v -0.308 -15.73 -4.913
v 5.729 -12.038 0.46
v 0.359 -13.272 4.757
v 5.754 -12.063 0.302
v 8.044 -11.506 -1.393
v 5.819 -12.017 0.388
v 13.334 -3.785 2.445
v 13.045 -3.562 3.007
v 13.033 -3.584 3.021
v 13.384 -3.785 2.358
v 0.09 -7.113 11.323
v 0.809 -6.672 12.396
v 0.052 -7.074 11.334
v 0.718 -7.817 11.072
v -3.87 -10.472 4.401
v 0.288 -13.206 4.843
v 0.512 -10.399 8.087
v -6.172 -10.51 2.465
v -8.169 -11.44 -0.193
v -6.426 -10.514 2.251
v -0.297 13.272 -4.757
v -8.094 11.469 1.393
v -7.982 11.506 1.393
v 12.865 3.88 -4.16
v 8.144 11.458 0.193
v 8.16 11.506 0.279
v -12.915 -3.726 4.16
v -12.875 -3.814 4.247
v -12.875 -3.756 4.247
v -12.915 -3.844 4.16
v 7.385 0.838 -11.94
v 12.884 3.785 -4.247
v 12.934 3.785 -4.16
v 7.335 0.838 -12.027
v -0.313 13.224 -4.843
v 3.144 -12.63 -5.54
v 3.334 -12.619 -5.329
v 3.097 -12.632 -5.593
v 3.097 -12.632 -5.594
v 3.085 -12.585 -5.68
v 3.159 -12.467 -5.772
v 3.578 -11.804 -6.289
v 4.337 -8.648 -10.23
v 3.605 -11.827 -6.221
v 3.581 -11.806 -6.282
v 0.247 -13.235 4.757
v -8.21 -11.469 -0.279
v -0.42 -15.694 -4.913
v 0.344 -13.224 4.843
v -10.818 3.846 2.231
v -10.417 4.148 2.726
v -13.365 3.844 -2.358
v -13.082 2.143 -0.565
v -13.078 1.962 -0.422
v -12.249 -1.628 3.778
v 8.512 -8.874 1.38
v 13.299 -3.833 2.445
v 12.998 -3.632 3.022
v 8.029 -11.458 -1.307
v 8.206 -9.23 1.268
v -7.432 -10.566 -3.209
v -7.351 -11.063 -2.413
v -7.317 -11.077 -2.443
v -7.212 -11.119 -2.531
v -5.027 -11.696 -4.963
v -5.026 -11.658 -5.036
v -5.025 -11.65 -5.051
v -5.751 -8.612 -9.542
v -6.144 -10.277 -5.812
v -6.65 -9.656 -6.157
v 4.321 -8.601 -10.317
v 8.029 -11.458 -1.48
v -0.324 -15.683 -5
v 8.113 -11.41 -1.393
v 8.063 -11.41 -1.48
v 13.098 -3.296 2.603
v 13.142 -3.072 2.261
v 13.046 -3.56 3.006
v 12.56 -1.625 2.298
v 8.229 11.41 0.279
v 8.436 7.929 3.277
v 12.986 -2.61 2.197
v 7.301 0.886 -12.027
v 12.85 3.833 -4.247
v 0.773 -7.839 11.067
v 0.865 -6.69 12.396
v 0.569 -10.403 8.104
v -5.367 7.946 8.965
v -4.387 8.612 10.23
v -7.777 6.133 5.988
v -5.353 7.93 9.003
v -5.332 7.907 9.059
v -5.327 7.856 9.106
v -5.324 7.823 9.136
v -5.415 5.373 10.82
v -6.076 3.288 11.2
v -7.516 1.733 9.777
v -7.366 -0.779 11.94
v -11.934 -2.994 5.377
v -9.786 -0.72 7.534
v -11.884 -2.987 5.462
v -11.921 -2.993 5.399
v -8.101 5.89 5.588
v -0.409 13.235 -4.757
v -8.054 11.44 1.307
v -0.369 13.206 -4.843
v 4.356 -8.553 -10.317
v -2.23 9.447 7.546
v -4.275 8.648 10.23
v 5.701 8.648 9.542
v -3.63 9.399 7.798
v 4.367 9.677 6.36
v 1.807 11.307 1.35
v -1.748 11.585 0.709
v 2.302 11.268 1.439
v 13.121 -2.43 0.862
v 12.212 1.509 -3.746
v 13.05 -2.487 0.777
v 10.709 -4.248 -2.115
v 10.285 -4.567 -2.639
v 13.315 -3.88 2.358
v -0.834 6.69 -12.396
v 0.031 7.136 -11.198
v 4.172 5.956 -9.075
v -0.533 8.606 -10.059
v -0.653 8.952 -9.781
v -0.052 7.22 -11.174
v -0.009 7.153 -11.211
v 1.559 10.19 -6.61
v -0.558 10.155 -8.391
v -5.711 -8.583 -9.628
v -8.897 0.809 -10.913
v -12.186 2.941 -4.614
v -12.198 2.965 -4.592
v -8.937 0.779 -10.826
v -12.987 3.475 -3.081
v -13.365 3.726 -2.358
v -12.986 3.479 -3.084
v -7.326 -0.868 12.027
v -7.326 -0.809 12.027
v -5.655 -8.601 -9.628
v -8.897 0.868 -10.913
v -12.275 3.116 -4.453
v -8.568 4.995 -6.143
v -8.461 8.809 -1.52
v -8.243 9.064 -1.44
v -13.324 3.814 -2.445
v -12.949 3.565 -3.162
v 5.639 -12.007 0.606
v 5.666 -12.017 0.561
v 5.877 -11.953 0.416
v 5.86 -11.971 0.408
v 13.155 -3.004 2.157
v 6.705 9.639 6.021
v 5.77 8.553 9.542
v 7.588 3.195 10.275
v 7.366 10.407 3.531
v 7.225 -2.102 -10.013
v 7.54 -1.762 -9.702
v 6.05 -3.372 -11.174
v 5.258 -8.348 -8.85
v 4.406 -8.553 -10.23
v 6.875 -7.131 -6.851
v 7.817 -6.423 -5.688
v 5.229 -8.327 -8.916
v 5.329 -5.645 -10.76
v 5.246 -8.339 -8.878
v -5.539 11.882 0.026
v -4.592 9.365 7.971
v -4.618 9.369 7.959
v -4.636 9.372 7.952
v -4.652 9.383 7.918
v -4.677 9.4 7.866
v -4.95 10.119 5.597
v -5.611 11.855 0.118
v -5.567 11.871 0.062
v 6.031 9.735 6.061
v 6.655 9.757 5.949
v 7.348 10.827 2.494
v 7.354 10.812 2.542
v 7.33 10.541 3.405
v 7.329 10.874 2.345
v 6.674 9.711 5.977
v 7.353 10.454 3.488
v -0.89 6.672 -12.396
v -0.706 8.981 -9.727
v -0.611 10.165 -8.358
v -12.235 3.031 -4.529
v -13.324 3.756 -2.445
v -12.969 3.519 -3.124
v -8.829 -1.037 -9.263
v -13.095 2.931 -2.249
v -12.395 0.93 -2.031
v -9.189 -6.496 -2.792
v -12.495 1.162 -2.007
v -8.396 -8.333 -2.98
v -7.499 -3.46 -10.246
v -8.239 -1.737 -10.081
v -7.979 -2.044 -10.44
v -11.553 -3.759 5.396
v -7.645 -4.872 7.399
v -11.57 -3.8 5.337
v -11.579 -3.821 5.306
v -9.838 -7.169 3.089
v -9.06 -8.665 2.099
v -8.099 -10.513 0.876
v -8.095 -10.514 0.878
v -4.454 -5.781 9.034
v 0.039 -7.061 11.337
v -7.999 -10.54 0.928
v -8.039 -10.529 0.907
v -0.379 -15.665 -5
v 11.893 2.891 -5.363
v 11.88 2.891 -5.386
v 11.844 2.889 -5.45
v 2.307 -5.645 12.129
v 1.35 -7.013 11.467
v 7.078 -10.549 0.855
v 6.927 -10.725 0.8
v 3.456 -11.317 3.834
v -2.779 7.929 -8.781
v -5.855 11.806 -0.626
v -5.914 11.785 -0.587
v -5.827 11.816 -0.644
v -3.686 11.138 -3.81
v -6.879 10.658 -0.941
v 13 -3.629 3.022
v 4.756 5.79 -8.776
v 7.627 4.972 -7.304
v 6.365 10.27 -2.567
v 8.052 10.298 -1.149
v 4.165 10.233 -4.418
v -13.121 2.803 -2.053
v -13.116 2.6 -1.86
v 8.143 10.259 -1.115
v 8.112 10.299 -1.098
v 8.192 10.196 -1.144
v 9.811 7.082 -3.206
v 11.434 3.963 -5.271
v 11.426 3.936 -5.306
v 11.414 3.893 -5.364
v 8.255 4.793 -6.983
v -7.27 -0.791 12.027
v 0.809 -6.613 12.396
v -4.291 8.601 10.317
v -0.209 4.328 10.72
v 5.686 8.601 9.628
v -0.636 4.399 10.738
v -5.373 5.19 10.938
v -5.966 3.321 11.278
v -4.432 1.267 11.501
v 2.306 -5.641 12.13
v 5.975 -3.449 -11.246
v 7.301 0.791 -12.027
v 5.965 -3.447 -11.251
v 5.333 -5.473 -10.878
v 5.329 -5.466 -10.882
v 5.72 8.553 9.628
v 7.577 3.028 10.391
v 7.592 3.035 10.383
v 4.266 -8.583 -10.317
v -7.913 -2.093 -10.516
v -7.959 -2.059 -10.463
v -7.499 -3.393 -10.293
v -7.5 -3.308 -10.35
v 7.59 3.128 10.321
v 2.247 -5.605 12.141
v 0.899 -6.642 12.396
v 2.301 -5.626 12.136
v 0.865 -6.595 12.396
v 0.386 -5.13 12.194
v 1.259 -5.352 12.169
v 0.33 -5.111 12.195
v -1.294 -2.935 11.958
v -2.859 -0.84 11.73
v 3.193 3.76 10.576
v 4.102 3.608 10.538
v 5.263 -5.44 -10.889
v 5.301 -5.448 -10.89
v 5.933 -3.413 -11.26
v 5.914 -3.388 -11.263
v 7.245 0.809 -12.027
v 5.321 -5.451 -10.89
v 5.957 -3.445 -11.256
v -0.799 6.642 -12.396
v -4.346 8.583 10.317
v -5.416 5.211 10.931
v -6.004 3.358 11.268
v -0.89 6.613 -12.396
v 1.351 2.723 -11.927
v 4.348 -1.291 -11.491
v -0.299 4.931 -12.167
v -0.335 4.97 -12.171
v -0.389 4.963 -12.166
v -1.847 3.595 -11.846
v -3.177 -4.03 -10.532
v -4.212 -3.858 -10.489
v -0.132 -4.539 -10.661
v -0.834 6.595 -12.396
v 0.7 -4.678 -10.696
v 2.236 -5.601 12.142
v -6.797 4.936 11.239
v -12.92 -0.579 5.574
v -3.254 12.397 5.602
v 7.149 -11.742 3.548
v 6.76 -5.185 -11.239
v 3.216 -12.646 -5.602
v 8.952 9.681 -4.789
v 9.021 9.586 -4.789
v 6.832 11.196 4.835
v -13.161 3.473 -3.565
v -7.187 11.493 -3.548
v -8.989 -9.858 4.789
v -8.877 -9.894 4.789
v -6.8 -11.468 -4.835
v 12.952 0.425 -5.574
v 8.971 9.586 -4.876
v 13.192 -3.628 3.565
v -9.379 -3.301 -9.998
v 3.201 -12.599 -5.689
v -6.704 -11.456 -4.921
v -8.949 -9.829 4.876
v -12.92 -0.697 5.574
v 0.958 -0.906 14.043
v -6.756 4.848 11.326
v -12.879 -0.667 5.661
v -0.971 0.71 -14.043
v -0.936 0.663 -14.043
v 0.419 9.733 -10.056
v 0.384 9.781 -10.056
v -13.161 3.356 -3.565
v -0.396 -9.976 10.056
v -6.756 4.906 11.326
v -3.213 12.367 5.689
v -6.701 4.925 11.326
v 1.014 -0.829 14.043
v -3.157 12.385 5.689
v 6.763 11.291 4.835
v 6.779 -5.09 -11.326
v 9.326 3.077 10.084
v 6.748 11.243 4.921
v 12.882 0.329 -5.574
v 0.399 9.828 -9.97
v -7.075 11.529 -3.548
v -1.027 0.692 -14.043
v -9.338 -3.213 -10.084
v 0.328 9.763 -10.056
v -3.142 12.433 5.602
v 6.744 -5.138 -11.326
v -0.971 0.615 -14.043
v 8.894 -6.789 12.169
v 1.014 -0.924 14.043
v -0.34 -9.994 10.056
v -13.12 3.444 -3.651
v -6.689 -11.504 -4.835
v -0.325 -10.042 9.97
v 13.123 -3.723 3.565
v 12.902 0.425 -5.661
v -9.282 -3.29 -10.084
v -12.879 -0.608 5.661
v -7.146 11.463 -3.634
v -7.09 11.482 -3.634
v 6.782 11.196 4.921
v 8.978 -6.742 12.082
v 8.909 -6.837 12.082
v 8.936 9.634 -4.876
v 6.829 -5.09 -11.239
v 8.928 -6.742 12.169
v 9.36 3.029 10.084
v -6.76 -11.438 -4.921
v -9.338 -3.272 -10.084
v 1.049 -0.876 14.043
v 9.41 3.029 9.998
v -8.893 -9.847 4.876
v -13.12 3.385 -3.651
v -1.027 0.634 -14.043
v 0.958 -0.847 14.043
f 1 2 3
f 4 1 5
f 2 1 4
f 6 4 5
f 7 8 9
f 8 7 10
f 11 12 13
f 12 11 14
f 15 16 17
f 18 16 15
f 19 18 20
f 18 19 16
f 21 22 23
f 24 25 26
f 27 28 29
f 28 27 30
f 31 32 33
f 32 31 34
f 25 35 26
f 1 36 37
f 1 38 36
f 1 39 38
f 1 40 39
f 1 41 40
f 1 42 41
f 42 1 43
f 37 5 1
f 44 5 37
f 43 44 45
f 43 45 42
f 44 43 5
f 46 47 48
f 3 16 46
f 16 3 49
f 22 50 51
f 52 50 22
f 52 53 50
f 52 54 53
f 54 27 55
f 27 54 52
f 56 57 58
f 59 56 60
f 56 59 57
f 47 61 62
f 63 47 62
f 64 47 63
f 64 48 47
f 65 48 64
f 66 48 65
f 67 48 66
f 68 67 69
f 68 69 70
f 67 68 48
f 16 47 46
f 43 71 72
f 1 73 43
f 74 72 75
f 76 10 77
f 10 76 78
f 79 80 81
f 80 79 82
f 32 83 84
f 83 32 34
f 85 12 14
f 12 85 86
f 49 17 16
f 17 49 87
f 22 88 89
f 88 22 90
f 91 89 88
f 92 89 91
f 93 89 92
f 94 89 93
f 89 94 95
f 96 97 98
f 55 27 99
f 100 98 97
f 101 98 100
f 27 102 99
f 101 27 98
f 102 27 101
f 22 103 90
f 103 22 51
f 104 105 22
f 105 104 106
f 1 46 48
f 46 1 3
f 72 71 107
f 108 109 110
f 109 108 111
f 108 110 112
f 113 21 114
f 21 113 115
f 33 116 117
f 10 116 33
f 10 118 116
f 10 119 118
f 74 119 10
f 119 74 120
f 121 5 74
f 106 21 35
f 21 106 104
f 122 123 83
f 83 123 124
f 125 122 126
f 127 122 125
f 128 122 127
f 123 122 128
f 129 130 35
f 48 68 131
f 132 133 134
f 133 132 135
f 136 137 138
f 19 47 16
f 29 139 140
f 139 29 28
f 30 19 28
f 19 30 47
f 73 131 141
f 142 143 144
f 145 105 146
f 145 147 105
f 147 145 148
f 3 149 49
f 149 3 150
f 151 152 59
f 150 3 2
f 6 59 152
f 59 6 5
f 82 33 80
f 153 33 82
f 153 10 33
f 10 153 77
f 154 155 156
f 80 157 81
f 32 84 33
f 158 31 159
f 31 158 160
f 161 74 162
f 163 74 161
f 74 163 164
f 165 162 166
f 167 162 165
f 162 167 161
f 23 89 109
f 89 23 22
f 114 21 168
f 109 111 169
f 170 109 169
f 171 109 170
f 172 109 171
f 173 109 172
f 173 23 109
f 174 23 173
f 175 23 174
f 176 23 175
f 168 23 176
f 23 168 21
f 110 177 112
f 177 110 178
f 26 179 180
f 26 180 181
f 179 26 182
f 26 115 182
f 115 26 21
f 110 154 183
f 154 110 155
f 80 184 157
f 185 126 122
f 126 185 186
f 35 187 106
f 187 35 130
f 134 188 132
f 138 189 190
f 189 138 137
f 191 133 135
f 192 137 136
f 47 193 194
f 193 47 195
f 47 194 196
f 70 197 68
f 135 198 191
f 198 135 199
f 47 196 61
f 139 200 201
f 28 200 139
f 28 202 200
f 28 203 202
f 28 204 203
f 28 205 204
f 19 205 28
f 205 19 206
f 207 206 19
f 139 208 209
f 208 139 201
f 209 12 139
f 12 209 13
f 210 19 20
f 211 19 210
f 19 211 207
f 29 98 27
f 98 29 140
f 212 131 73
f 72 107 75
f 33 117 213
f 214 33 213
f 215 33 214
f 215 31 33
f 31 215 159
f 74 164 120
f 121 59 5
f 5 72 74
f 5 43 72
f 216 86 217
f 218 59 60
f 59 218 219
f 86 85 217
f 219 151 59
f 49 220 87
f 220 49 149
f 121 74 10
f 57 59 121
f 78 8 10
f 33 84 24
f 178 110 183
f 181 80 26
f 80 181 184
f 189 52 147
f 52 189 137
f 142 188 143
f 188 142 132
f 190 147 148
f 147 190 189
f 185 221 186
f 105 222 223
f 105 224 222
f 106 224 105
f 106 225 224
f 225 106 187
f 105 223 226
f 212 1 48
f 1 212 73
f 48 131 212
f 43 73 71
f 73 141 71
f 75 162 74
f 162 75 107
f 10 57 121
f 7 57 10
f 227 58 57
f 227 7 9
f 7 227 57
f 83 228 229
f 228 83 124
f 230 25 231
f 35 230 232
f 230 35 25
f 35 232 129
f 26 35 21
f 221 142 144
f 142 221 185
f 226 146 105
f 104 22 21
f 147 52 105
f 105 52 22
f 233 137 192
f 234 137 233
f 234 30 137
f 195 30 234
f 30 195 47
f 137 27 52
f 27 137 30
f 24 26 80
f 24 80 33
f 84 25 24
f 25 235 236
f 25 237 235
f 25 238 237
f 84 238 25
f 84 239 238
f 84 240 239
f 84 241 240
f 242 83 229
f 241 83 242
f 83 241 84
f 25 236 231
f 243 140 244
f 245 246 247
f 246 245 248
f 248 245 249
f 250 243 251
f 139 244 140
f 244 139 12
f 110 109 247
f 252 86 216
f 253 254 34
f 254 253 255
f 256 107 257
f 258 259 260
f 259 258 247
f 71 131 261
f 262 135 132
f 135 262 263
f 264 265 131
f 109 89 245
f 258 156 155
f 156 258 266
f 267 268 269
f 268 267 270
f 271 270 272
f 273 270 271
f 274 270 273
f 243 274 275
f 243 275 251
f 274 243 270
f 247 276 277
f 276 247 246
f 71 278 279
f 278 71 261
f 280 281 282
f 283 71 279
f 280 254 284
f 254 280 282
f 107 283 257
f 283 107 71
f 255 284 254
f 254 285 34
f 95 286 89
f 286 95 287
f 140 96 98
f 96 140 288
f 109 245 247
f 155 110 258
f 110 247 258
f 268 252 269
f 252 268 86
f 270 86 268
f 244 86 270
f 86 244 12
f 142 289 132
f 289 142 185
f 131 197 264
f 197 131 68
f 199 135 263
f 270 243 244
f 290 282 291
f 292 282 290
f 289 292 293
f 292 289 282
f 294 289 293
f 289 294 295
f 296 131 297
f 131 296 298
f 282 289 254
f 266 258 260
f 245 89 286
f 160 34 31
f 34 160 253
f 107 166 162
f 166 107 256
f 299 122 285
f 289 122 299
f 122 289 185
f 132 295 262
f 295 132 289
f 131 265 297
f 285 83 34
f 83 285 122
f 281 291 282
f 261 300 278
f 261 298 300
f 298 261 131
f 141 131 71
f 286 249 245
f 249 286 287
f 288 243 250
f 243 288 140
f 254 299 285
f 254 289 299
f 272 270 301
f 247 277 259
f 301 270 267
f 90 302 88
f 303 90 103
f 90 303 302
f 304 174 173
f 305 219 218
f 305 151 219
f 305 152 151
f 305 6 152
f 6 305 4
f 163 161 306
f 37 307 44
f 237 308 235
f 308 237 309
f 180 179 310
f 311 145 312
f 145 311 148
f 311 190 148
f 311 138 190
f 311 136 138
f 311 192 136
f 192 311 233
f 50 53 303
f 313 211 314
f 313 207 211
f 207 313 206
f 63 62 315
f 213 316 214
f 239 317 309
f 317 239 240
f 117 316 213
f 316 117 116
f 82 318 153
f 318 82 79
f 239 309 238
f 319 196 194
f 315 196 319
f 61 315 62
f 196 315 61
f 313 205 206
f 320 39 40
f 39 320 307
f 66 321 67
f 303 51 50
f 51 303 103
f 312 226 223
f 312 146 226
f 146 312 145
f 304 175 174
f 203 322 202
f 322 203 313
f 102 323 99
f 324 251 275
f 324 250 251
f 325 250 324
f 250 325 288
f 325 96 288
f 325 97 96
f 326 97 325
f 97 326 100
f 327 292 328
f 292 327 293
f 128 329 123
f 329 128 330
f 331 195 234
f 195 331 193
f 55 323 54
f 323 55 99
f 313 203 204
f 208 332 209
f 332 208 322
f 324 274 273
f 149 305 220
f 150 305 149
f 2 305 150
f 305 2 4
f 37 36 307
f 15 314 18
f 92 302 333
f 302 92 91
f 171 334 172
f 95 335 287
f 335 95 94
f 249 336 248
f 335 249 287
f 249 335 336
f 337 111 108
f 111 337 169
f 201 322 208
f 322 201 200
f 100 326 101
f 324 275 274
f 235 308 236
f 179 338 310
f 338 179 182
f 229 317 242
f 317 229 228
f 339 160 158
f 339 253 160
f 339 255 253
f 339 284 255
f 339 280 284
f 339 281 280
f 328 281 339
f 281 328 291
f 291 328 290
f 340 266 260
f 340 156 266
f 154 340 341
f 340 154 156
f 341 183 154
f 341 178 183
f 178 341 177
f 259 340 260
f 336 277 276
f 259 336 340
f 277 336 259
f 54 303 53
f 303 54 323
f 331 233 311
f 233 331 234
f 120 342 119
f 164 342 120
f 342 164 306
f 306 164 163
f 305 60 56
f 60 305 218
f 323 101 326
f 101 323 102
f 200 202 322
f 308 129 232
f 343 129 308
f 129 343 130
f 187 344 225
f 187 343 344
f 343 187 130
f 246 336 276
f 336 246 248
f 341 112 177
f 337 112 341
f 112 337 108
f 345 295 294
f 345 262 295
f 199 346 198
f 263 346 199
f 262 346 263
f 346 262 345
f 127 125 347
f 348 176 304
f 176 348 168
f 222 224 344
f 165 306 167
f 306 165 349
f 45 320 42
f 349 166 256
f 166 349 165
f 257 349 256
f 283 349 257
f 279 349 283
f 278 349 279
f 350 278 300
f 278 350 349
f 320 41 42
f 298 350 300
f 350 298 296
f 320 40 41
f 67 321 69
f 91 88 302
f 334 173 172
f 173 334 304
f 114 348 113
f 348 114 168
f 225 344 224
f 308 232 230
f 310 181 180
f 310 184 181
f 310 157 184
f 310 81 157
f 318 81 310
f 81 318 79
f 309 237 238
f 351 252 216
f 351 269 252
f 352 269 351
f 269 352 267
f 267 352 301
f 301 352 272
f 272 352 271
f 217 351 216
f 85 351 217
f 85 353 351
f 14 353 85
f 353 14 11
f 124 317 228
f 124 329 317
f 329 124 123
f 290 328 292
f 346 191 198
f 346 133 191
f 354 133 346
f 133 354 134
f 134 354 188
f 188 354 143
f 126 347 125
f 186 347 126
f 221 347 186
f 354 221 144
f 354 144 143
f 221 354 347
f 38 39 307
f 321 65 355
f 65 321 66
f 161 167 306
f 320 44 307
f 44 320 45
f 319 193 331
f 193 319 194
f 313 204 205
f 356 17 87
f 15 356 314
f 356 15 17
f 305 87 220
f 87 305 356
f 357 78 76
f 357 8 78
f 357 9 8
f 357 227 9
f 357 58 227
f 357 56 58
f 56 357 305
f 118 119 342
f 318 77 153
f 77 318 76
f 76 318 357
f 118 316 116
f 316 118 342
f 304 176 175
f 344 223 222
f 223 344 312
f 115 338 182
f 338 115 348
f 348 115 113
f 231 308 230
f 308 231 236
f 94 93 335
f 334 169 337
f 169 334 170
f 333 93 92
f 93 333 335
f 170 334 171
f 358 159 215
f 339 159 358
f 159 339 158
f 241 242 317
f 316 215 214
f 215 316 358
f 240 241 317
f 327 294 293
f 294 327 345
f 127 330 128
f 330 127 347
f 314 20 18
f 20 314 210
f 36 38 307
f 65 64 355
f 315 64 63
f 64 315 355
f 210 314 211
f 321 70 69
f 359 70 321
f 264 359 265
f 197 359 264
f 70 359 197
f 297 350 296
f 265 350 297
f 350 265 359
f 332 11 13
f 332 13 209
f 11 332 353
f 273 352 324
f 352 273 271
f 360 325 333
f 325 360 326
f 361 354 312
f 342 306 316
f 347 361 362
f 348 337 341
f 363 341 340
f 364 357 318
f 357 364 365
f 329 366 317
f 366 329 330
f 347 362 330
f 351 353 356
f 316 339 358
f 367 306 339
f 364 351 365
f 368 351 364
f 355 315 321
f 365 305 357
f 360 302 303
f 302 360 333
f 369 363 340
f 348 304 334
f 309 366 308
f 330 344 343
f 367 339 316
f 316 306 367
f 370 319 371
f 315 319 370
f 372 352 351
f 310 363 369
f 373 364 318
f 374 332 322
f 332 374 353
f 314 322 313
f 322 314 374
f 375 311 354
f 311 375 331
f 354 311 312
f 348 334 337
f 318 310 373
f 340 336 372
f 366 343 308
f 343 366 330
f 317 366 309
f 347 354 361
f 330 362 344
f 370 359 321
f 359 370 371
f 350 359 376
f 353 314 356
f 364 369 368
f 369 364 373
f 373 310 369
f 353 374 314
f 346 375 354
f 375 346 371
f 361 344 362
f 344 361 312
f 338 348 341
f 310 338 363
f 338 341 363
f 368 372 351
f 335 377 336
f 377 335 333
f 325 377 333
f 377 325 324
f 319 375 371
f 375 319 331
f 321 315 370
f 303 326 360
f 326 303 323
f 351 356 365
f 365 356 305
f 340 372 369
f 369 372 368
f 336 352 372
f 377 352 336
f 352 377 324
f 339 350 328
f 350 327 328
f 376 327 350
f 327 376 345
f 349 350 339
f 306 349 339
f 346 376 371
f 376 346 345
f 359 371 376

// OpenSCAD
// Auto-generated OpenSCAD file

    inner_points = 10*[[0.0998930354475761, -0.08761839771919257, 1.3956184279718415], [0.6728697039772034, -0.5090233371692008, -1.1239485150914914], [-0.6716026362296299, 0.487698807845633, 1.1239485150914914], [-0.0986259677000027, 0.06629386839562477, -1.3956184279718415], [-0.8908119004872508, -0.979928839088502, 0.47892884316814505], [-0.6719542878696155, -1.1408912029313139, -0.48346009215137703], [0.673221355617189, 1.1195666736077459, 0.48346009215137703], [0.8920789682348242, 0.9586043097649343, -0.47892884316814505], [0.7118307070376008, -1.1647302272134858, 0.35475514127068664], [-1.3079711835867545, 0.3414697712678377, -0.35648592437079285], [1.3092382513343277, -0.36279430059140544, 0.35648592437079285], [-0.7105636392900273, 1.1434056978899179, -0.35475514127068664], [-0.035585740512491165, -0.9946621663535183, 0.9969743473109073], [0.3185333153995008, -1.2551047419607149, -0.5602036604329037], [-1.28389195945964, -0.06377937343702057, 0.5574031945497779], [-0.9297729035476481, -0.3242219490442169, -0.999774813194033], [0.9310399712952215, 0.30289741972064915, 0.999774813194033], [1.2851590272072133, 0.04245484411345278, -0.5574031945497779], [-0.31726624765192735, 1.2337802126371469, 0.5602036604329037], [0.03685280826006457, 0.9733376370299506, -0.9969743473109073], [0.8878158417756826, -0.674182307300777, 1.208213968994985]];

    outer_points = 10*[[0.03282366802055475, -1.3176403726430708, 0.4756805091246931], [-0.08493614308928757, 0.6642367211098263, -1.2308943583788188], [0.08493614308928757, -0.6642367211098263, 1.2308943583788188], [-0.03282366802055475, 1.3176403726430708, -0.4756805091246931], [-1.283421516714085, -0.3785048441443724, 0.4160394031302599], [-1.3284017620492774, 0.3785048441443724, -0.2358141919097333], [1.3284017620492774, -0.3785048441443724, 0.2358141919097333], [1.283421516714085, 0.3785048441443724, -0.4160394031302599], [-0.5670299754236185, -0.8553164840436631, -0.9541678105326641], [-0.43059774445579446, 0.8553164840436631, 1.0230077155892763], [0.43059774445579446, -0.8553164840436631, -1.0230077155892763], [0.5670299754236185, 0.8553164840436631, 0.9541678105326641], [-0.8128678745041953, -1.141048361009117, -0.027927549120190846], [-0.8856474402788453, 0.0838190444550353, -1.0826488215837096], [-0.728548118605104, -0.0838190444550353, 1.194034127747624], [-0.8013276843797541, 1.141048361009117, 0.1393128552841052], [0.8013276843797541, -1.141048361009117, -0.1393128552841052], [0.728548118605104, 0.0838190444550353, -1.194034127747624], [0.8856474402788453, -0.0838190444550353, 1.0826488215837096], [0.8128678745041953, 1.141048361009117, 0.027927549120190846], [-0.033902923914046645, -1.5635173407451266, -0.4913210826453173]];

    // Convex hull for inner set (I)
    module inner_hull() {
        hull() {
            for (p = inner_points) {
                translate(p) sphere(r=0.1);
            }
        }
    }

    // Convex hull for outer set (O) minus inner hull (O \ I)
    module outer_minus_inner() {
        difference() {
            hull() {
                for (p = outer_points) {
                    translate(p) sphere(r=0.1);
                }
            }
            inner_hull(); // Subtract inner hull
        }
    }

    // Convex hull for outer set (O) minus all translated inner hulls
    module outer_minus_AllTranslationInner() {
        difference() {
            hull() {
                for (p = outer_points) {
                    translate(p) sphere(r=0.1);
                }
            }
            hull() {
                translate([0,0,50]) inner_hull();
                translate([0,0,-50]) inner_hull();
            }; // Subtract translated inner hulls
        }
    }

    // Difference between outer_minus_inner and outer_minus_AllTranslationInner
    module outer_minus_inner_diff() {
        difference() {
            // Outer minus inner
            difference() {
                hull() {
                    for (p = outer_points) {
                        translate(p) sphere(r=0.1);
                    }
                }
                inner_hull();
            }

            // Subtract Outer minus AllTranslationInner
            difference() {
                hull() {
                    for (p = outer_points) {
                        translate(p) sphere(r=0.1);
                    }
                }
                hull() {
                    translate([0,0,50]) inner_hull();
                    translate([0,0,-50]) inner_hull();
                };
            }
        }
    }

    // Rendering all with colors applied
    color([1, 0, 0, 0.5]) inner_hull(); // Transparent red
    color([0, 1, 0, 1]) outer_minus_AllTranslationInner(); // Opaque green
    color([1, 1, 0, 1]) outer_minus_inner_diff(); // Opaque yellow
    
